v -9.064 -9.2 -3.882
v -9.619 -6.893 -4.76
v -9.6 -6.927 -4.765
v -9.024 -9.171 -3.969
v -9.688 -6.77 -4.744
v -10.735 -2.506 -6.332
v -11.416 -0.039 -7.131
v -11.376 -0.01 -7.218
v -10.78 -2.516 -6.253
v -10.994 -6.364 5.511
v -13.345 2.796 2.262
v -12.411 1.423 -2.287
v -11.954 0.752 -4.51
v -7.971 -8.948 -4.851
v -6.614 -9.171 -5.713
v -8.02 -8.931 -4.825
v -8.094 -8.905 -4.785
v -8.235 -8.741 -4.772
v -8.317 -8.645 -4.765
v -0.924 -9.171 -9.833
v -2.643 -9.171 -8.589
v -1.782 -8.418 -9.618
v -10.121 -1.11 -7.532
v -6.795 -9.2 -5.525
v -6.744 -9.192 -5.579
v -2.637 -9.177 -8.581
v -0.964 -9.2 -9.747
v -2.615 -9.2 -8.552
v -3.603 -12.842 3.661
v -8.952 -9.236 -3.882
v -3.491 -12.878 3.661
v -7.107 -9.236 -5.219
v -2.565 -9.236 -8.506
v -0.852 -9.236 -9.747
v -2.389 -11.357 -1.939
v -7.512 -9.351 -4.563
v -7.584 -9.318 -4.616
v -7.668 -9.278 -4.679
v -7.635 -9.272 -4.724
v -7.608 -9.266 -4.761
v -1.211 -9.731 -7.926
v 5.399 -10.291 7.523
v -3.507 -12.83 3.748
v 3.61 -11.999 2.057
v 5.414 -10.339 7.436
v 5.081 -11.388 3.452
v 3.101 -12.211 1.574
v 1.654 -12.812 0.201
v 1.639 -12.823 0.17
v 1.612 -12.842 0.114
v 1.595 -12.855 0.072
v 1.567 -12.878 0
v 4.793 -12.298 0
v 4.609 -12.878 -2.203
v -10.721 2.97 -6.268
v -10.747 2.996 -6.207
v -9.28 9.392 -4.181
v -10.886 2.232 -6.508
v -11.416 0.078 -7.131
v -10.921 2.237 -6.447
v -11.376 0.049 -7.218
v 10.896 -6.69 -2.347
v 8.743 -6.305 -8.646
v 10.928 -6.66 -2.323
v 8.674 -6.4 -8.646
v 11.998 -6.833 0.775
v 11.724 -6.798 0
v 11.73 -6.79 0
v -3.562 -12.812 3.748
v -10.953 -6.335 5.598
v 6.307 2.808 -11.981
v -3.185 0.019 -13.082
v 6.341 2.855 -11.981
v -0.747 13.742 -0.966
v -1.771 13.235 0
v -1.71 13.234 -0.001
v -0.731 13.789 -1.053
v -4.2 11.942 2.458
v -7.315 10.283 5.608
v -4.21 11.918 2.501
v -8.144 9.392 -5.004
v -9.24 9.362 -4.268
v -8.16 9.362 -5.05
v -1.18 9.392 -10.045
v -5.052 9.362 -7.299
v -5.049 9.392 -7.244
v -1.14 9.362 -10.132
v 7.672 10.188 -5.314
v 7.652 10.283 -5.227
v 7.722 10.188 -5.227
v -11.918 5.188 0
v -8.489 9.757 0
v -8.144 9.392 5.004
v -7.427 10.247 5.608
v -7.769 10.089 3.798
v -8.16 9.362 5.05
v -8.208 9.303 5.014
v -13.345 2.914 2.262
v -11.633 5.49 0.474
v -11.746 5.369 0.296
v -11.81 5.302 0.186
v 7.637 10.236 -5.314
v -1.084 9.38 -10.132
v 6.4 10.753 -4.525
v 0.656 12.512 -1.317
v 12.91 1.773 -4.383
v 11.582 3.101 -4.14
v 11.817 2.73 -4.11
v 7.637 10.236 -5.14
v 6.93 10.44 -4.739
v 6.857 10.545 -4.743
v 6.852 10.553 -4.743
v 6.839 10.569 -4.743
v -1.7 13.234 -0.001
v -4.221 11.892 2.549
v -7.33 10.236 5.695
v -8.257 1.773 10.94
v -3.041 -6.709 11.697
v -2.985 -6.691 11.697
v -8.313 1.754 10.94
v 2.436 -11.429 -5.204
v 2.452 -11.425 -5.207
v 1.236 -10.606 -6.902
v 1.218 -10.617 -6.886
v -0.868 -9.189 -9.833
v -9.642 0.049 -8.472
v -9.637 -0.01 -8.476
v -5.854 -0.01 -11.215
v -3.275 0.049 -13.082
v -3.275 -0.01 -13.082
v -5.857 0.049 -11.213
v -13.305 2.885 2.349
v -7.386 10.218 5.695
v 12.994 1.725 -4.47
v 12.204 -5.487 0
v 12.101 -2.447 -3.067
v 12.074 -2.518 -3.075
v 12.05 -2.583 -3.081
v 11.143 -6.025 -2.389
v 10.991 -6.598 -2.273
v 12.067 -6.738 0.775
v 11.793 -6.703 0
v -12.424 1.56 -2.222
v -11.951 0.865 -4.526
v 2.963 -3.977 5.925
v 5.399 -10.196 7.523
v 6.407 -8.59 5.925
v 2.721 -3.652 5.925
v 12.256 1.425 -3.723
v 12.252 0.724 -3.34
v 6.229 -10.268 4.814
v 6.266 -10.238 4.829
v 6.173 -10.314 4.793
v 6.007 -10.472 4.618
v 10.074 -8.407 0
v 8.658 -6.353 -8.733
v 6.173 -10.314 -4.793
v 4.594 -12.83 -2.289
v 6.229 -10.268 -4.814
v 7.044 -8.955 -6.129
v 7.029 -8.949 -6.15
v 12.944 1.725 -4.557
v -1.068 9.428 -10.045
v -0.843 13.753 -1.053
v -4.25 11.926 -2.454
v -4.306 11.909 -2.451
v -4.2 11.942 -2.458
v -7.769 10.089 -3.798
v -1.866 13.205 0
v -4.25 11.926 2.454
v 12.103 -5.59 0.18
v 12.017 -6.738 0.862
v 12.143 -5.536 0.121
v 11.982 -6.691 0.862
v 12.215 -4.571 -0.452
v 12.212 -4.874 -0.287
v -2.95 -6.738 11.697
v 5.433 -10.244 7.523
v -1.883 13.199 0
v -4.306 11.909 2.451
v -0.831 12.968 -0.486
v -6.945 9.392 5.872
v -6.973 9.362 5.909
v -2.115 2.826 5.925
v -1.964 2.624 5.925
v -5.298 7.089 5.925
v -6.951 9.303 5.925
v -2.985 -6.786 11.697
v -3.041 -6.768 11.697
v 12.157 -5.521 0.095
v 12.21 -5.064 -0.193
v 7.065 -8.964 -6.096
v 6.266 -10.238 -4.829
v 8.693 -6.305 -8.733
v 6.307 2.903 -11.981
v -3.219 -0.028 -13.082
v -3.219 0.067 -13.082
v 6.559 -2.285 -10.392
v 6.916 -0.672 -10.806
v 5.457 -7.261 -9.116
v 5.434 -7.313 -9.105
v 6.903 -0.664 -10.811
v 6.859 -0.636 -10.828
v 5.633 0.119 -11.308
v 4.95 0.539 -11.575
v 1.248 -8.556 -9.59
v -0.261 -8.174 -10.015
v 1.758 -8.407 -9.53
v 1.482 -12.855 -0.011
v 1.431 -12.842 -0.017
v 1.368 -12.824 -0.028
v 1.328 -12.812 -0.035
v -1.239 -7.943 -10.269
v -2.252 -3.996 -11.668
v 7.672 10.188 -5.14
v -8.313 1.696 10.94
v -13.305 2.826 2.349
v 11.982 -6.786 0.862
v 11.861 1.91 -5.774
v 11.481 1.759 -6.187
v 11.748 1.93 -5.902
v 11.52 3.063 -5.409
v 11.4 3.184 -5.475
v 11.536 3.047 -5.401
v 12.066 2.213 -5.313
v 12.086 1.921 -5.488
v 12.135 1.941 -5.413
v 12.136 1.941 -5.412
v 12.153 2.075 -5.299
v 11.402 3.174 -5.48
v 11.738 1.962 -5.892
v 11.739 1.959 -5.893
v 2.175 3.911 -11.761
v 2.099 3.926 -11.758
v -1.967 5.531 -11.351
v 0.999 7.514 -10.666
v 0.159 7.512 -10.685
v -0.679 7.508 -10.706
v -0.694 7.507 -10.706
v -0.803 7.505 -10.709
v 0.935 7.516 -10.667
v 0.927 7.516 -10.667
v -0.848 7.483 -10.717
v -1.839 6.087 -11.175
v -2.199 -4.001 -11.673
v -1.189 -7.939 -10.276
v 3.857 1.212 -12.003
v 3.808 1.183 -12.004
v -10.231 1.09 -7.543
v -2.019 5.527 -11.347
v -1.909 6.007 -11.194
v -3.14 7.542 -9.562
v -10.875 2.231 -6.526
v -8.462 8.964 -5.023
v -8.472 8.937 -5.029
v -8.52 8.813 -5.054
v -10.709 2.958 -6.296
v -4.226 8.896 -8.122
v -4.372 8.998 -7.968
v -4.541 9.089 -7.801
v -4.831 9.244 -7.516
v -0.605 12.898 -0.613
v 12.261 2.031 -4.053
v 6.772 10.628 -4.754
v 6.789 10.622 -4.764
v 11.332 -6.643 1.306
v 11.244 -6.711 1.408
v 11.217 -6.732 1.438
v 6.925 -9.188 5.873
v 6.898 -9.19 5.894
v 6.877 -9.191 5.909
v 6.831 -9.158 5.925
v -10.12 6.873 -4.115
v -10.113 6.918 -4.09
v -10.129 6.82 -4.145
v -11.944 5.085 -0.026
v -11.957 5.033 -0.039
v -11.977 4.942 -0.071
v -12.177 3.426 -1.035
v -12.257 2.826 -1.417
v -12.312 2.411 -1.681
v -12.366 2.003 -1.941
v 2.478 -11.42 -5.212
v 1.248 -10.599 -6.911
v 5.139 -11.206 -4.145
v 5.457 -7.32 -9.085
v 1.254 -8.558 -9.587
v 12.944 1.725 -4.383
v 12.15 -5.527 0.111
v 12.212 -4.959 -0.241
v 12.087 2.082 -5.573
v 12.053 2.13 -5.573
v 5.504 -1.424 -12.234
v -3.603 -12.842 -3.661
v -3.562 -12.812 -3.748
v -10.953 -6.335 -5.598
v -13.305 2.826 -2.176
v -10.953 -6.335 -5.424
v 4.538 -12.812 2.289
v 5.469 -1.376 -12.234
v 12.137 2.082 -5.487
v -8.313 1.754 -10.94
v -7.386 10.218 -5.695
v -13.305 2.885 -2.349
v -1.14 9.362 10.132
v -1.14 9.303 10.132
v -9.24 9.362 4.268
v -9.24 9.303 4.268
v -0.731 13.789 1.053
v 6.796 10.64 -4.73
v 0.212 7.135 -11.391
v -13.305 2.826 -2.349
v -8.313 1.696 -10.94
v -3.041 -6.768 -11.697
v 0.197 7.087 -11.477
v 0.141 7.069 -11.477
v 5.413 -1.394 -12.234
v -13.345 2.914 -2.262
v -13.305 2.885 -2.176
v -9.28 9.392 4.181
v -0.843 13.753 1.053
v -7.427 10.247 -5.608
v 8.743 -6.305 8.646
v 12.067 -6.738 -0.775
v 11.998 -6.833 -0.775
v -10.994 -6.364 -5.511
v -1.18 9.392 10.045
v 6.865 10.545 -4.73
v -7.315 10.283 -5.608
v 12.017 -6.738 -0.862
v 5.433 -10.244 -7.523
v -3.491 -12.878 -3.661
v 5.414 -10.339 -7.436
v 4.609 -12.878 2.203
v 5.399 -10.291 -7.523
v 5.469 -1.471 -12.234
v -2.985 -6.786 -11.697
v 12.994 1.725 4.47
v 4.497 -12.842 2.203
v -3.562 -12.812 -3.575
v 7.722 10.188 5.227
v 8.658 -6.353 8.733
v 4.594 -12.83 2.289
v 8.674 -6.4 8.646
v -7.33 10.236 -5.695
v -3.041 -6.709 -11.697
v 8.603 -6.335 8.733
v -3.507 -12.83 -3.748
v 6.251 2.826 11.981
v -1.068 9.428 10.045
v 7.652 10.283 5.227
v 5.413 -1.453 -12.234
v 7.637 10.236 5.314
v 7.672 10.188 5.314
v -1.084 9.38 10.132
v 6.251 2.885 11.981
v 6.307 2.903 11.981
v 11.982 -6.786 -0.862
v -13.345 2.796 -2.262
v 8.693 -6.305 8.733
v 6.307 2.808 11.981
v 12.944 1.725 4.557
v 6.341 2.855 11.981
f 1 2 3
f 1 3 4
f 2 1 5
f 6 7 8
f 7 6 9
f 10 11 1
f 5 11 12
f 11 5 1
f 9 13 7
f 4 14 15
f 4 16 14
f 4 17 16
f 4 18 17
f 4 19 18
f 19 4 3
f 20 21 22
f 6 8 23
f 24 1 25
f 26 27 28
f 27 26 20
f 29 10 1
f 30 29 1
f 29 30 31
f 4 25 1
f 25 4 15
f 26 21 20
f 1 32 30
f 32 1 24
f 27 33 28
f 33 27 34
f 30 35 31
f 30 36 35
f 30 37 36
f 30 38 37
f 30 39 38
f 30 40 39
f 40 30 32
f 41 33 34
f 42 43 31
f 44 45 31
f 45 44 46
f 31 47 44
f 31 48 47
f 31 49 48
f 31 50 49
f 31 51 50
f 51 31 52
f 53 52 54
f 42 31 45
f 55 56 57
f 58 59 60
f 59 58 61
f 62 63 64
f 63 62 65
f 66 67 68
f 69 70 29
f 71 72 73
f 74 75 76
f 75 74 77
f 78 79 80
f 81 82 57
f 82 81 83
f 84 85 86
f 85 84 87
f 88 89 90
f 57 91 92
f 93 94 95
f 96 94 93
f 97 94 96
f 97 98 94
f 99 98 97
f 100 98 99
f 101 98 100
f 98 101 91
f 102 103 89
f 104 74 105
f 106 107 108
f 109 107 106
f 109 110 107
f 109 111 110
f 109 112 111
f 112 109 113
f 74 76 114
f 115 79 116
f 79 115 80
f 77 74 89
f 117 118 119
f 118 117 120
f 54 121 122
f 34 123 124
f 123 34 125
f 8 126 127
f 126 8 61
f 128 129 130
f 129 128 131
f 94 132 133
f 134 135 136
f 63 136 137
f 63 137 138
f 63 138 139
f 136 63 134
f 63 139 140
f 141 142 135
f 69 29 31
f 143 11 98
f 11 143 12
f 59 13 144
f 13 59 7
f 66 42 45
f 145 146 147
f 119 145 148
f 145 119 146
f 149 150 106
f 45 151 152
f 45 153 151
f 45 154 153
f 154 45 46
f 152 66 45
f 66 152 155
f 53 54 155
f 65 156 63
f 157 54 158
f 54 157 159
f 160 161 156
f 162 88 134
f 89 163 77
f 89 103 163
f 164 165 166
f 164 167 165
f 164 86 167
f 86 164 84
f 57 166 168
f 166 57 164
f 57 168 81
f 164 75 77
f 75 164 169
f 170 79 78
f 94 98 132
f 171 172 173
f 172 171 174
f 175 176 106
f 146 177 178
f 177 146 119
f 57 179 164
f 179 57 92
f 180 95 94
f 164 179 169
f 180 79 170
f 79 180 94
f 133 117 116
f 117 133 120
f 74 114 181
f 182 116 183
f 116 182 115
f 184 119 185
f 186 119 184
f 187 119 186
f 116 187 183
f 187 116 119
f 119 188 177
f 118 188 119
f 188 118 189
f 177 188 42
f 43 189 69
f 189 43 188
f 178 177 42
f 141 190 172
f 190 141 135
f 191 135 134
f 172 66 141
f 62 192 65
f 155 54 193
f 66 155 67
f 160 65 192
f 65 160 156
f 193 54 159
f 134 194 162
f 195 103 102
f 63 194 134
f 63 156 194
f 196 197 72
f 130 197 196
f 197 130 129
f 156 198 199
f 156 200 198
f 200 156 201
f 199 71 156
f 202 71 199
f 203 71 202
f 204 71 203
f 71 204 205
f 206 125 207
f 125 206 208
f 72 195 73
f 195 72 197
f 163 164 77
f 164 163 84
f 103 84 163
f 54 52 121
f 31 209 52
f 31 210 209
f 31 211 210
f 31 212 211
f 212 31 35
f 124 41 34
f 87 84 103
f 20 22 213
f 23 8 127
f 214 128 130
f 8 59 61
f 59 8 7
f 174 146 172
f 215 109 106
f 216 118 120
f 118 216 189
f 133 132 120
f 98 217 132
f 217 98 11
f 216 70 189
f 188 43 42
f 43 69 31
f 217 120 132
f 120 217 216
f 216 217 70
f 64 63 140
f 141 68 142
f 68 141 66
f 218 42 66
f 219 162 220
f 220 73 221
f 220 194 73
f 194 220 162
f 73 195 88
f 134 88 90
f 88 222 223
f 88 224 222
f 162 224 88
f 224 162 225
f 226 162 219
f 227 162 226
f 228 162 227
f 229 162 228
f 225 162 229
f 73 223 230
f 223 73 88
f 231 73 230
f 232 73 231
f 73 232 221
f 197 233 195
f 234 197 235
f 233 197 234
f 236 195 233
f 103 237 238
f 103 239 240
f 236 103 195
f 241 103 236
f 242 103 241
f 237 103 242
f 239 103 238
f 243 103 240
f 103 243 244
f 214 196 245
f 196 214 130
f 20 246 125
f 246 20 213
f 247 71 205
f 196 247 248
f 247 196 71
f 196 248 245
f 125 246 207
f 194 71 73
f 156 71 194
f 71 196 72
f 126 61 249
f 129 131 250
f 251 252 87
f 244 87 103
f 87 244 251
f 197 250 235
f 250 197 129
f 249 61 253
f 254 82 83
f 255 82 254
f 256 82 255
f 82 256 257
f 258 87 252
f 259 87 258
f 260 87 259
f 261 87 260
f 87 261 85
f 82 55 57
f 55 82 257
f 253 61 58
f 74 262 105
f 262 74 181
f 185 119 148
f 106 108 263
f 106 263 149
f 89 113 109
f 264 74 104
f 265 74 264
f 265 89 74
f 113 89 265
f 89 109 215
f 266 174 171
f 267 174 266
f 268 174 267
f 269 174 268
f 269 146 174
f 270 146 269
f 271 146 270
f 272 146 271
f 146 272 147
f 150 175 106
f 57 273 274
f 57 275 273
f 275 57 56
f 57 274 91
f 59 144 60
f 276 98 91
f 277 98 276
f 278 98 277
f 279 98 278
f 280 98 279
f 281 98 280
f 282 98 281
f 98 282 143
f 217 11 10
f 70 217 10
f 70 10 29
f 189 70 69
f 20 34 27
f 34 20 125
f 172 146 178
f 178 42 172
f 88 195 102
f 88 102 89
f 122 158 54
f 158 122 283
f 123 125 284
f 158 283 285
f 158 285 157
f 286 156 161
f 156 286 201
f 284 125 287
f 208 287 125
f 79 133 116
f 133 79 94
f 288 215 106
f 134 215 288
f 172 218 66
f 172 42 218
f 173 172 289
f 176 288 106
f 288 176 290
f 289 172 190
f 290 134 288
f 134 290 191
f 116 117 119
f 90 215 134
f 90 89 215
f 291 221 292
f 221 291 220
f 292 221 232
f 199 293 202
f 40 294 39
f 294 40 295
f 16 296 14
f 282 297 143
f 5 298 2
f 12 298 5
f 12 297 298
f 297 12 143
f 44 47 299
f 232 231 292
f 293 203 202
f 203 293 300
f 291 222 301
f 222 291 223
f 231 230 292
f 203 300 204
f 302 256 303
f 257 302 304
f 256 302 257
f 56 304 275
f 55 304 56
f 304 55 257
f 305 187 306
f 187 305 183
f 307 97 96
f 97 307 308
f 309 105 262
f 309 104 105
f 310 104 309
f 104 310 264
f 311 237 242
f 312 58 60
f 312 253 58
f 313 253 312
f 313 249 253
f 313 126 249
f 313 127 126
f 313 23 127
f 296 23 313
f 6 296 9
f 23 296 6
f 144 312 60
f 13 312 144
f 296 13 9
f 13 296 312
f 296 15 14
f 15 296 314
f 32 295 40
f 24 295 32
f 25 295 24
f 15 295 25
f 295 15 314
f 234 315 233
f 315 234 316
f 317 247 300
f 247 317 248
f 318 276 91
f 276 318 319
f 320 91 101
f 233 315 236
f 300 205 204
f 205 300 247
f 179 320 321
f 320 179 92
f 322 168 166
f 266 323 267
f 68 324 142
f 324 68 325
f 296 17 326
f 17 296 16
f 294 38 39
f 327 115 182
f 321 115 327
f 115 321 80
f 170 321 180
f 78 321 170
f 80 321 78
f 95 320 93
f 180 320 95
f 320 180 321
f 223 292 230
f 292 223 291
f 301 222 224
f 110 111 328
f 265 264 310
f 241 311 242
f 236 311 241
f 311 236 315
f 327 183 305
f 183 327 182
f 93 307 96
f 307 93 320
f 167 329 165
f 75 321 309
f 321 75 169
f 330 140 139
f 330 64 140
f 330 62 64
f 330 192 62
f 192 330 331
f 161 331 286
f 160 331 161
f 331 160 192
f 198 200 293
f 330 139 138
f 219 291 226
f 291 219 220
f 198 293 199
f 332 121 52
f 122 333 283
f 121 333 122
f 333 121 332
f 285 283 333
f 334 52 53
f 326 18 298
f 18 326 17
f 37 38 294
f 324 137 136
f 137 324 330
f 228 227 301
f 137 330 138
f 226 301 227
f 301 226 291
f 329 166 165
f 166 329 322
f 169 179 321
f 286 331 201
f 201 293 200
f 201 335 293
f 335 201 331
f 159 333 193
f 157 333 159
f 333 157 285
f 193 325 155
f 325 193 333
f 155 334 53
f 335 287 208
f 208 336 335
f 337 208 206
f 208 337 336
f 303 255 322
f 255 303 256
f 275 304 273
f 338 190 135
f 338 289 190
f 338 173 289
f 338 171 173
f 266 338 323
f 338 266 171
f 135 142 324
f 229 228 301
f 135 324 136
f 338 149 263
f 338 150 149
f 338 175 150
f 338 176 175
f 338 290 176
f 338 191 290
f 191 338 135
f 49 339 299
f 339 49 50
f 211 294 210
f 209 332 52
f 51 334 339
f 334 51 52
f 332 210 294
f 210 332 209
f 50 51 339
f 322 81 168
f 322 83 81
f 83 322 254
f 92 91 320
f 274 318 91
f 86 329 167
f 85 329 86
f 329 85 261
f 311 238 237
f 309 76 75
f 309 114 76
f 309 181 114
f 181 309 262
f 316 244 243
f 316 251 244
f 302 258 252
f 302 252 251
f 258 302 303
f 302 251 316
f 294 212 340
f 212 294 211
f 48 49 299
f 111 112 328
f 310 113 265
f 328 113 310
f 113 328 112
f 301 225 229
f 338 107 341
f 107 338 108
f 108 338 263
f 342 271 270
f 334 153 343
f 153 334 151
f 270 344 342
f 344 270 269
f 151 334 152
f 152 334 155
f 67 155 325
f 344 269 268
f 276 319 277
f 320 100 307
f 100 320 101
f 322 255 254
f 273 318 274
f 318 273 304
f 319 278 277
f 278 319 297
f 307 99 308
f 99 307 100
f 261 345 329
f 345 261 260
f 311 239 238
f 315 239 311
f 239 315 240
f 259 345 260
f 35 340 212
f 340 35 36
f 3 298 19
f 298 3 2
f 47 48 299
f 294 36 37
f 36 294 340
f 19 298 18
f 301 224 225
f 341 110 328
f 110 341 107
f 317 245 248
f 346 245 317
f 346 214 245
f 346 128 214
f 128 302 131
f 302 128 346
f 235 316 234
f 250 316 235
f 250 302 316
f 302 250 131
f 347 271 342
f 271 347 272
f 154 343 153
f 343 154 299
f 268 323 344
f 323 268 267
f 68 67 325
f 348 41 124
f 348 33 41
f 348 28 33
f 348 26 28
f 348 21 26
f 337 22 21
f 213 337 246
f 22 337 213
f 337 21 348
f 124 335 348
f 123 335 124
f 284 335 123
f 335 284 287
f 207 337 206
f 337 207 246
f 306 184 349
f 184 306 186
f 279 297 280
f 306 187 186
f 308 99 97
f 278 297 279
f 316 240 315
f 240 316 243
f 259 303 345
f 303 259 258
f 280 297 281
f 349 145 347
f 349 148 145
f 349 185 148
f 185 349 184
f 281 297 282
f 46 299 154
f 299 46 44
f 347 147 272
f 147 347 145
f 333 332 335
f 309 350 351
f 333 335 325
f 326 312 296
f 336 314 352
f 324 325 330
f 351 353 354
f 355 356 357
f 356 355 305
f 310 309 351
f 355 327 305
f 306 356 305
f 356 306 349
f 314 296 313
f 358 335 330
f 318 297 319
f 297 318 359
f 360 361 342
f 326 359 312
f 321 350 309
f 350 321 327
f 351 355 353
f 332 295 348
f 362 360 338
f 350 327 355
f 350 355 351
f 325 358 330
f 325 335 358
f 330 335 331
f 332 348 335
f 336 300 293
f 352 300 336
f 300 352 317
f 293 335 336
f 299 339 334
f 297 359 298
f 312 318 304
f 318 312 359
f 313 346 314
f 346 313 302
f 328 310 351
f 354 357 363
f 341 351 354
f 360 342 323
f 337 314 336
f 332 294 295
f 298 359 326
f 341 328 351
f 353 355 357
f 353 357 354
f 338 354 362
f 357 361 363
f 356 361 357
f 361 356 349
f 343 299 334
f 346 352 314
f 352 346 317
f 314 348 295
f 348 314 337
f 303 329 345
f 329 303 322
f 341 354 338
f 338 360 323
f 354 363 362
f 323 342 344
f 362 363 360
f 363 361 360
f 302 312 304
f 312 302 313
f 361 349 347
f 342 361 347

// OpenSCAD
// Auto-generated OpenSCAD file

    inner_points = 10*[[-0.8272709439258851, 0.17250574680152558, -1.085356370379995], [-0.3000208722060624, -0.673824517218672, -1.1610692891914136], [0.7621572748828489, 1.018836010821184, 0.5227077285305861], [1.2894073466026714, 0.17250574680098618, 0.44699480971916755], [-0.7345602979402426, 1.0188360108215655, -0.5608281820767405], [0.53833397596794, -1.0243859908227981, -0.74361533751812], [-0.07619757329115358, 1.3693974844253103, 0.10525377685729254], [1.1966967006170288, -0.6738245172190535, -0.0775333785840871], [-1.0912605548199168, -0.6305363851239965, -0.5510972387851012], [0.6291241521432895, 0.2855248915222844, 1.189458799445929], [-0.9199536182758472, 0.9332780322219801, 0.41810447601210515], [0.4578172155992198, -1.278289525823692, 0.22025708464872243], [-1.326431597387023, 0.2855248915227826, -0.22624909246720426], [-0.3522004978329189, -1.2782895258234854, -0.36614832454032104], [-0.10993590484370842, 0.9332780322217736, 1.0045098852011487], [0.8642951947103956, -0.6305363851244946, 0.864610653128032], [0.018107748679271438, 0.7039670605239071, -1.1390568182894552], [0.5453578203990939, -0.14236320349629056, -1.2147697371008737], [0.6764704733283603, 1.054528534127652, -0.47297485935542216], [1.203720545048183, 0.20819827010745423, -0.5486877781668408]];

    outer_points = 10*[[0.8642951947101556, -0.6305363851244028, -0.8646106531284449], [0.6291241521429305, 0.28552489152246463, -1.1894587994460062], [-1.0912605548197898, -0.6305363851244028, 0.551097238785195], [-1.3264315973870149, 0.28552489152246463, 0.22624909246763364], [0.45781721559917127, -1.2782895258238085, -0.2202570846492242], [-0.10993590484404386, 0.9332780322218704, -1.0045098852008405], [-0.35220049783281543, -1.2782895258238085, 0.3661483245400292], [-0.9199536182760306, 0.9332780322218704, -0.41810447601158707], [1.2894073466025096, 0.17250574680096908, -0.4469948097194502], [-0.8272709439256501, 0.17250574680096908, 1.0853563703802613], [0.5383339759681318, -1.0243859908232005, 0.7436153375176736], [-0.0761975732912725, 1.3693974844251389, -0.1052537768568624], [1.1966967006170348, -0.6738245172192313, 0.07753337858357512], [0.7621572748826352, 1.0188360108211696, -0.5227077285304783], [-0.3000208722057758, -0.6738245172192313, 1.1610692891912895], [-0.7345602979401754, 1.0188360108211696, 0.5608281820772362], [-0.08831976886428294, -0.9141133036386847, -0.9746509296639724], [-0.323490811431508, 0.001947973008182724, -1.299499075981534], [-0.8983374822962696, -0.9141133036386847, -0.38824552047471894], [-1.1335085248634946, 0.001947973008182724, -0.7130936667922804]];

    // Convex hull for inner set (I)
    module inner_hull() {
        hull() {
            for (p = inner_points) {
                translate(p) sphere(r=0.1);
            }
        }
    }

    // Convex hull for outer set (O) minus inner hull (O \ I)
    module outer_minus_inner() {
        difference() {
            hull() {
                for (p = outer_points) {
                    translate(p) sphere(r=0.1);
                }
            }
            inner_hull(); // Subtract inner hull
        }
    }

    // Convex hull for outer set (O) minus all translated inner hulls
    module outer_minus_AllTranslationInner() {
        difference() {
            hull() {
                for (p = outer_points) {
                    translate(p) sphere(r=0.1);
                }
            }
            hull() {
                translate([0,0,50]) inner_hull();
                translate([0,0,-50]) inner_hull();
            }; // Subtract translated inner hulls
        }
    }

    // Difference between outer_minus_inner and outer_minus_AllTranslationInner
    module outer_minus_inner_diff() {
        difference() {
            // Outer minus inner
            difference() {
                hull() {
                    for (p = outer_points) {
                        translate(p) sphere(r=0.1);
                    }
                }
                inner_hull();
            }

            // Subtract Outer minus AllTranslationInner
            difference() {
                hull() {
                    for (p = outer_points) {
                        translate(p) sphere(r=0.1);
                    }
                }
                hull() {
                    translate([0,0,50]) inner_hull();
                    translate([0,0,-50]) inner_hull();
                };
            }
        }
    }

    // Rendering all with colors applied
    color([1, 0, 0, 0.5]) inner_hull(); // Transparent red
    color([0, 1, 0, 1]) outer_minus_AllTranslationInner(); // Opaque green
    color([1, 1, 0, 1]) outer_minus_inner_diff(); // Opaque yellow
    
